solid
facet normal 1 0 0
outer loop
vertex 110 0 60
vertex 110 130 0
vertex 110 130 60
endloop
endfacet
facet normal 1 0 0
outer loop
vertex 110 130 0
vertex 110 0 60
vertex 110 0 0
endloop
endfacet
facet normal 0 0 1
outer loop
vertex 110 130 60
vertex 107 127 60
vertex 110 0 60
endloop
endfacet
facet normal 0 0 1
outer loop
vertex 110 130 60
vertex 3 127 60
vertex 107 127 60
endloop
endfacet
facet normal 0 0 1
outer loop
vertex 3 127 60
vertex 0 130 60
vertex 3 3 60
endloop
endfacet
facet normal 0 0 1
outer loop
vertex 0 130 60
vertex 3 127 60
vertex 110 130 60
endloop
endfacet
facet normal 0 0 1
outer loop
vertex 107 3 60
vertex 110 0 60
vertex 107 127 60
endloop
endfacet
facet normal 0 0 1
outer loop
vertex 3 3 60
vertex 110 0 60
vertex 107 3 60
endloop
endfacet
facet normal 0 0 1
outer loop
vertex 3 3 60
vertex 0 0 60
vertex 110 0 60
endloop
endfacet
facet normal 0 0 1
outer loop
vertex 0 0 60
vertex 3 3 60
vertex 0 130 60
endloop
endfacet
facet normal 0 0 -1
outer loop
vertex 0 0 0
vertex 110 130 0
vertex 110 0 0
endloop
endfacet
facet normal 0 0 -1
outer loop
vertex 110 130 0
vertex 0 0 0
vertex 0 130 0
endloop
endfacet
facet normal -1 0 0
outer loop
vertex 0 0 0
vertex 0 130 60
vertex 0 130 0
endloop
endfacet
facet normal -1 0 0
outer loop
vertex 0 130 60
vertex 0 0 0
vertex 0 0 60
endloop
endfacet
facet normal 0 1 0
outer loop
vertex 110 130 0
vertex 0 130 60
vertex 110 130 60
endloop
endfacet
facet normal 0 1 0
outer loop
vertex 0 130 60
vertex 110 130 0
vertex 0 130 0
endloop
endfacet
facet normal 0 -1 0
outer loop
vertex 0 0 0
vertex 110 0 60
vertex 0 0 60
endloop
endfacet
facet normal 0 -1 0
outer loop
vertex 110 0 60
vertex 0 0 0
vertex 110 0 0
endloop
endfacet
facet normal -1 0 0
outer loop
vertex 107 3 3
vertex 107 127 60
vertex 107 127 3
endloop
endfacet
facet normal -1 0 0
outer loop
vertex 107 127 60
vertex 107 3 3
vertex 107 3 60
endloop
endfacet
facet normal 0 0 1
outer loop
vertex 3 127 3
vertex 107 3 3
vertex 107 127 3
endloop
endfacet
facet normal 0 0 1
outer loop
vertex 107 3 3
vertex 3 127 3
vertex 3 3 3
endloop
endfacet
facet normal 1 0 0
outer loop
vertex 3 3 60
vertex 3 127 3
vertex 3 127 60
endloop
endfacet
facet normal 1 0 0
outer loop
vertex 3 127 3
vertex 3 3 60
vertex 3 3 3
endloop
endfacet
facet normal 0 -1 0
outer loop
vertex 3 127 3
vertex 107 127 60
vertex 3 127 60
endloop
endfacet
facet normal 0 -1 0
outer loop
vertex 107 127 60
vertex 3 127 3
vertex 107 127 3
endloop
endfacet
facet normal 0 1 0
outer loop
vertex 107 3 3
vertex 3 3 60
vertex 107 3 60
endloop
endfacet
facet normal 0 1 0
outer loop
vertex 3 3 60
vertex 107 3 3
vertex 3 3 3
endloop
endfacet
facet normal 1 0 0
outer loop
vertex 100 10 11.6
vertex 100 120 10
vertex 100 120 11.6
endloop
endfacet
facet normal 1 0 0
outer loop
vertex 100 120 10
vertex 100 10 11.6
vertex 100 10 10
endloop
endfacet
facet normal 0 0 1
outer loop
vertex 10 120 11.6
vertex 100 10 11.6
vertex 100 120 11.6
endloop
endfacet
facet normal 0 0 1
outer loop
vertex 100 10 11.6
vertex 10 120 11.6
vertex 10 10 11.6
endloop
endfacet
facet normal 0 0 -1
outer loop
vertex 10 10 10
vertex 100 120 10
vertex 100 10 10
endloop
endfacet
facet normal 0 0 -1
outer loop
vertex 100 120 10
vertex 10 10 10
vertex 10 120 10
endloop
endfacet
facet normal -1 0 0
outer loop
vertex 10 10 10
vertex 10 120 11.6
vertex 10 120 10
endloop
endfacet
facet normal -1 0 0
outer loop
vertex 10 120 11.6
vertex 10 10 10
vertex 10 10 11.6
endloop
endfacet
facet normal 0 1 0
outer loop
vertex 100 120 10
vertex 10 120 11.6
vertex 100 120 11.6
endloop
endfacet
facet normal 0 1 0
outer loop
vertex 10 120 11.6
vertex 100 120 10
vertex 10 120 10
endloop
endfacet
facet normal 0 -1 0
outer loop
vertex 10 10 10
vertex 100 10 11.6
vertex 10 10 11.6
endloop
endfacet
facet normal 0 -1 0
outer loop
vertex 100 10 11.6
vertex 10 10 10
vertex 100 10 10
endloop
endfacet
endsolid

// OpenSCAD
// Board outline from beta PCB Edge.Cuts (70,15) to (160,125).
// Board thickness 1.6 mm from PCB general. Housing dimensions assumed.
module magnos_beta_board() { color("green") cube([90,110,1.6]); }
module magnos_beta_enclosure() {
  color("darkslategray") difference() {
    cube([110,130,60]);
    translate([3,3,3]) cube([104,124,60]);
  }
  translate([10,10,10]) magnos_beta_board();
}
if(is_undef(assembly_include)) magnos_beta_enclosure();
